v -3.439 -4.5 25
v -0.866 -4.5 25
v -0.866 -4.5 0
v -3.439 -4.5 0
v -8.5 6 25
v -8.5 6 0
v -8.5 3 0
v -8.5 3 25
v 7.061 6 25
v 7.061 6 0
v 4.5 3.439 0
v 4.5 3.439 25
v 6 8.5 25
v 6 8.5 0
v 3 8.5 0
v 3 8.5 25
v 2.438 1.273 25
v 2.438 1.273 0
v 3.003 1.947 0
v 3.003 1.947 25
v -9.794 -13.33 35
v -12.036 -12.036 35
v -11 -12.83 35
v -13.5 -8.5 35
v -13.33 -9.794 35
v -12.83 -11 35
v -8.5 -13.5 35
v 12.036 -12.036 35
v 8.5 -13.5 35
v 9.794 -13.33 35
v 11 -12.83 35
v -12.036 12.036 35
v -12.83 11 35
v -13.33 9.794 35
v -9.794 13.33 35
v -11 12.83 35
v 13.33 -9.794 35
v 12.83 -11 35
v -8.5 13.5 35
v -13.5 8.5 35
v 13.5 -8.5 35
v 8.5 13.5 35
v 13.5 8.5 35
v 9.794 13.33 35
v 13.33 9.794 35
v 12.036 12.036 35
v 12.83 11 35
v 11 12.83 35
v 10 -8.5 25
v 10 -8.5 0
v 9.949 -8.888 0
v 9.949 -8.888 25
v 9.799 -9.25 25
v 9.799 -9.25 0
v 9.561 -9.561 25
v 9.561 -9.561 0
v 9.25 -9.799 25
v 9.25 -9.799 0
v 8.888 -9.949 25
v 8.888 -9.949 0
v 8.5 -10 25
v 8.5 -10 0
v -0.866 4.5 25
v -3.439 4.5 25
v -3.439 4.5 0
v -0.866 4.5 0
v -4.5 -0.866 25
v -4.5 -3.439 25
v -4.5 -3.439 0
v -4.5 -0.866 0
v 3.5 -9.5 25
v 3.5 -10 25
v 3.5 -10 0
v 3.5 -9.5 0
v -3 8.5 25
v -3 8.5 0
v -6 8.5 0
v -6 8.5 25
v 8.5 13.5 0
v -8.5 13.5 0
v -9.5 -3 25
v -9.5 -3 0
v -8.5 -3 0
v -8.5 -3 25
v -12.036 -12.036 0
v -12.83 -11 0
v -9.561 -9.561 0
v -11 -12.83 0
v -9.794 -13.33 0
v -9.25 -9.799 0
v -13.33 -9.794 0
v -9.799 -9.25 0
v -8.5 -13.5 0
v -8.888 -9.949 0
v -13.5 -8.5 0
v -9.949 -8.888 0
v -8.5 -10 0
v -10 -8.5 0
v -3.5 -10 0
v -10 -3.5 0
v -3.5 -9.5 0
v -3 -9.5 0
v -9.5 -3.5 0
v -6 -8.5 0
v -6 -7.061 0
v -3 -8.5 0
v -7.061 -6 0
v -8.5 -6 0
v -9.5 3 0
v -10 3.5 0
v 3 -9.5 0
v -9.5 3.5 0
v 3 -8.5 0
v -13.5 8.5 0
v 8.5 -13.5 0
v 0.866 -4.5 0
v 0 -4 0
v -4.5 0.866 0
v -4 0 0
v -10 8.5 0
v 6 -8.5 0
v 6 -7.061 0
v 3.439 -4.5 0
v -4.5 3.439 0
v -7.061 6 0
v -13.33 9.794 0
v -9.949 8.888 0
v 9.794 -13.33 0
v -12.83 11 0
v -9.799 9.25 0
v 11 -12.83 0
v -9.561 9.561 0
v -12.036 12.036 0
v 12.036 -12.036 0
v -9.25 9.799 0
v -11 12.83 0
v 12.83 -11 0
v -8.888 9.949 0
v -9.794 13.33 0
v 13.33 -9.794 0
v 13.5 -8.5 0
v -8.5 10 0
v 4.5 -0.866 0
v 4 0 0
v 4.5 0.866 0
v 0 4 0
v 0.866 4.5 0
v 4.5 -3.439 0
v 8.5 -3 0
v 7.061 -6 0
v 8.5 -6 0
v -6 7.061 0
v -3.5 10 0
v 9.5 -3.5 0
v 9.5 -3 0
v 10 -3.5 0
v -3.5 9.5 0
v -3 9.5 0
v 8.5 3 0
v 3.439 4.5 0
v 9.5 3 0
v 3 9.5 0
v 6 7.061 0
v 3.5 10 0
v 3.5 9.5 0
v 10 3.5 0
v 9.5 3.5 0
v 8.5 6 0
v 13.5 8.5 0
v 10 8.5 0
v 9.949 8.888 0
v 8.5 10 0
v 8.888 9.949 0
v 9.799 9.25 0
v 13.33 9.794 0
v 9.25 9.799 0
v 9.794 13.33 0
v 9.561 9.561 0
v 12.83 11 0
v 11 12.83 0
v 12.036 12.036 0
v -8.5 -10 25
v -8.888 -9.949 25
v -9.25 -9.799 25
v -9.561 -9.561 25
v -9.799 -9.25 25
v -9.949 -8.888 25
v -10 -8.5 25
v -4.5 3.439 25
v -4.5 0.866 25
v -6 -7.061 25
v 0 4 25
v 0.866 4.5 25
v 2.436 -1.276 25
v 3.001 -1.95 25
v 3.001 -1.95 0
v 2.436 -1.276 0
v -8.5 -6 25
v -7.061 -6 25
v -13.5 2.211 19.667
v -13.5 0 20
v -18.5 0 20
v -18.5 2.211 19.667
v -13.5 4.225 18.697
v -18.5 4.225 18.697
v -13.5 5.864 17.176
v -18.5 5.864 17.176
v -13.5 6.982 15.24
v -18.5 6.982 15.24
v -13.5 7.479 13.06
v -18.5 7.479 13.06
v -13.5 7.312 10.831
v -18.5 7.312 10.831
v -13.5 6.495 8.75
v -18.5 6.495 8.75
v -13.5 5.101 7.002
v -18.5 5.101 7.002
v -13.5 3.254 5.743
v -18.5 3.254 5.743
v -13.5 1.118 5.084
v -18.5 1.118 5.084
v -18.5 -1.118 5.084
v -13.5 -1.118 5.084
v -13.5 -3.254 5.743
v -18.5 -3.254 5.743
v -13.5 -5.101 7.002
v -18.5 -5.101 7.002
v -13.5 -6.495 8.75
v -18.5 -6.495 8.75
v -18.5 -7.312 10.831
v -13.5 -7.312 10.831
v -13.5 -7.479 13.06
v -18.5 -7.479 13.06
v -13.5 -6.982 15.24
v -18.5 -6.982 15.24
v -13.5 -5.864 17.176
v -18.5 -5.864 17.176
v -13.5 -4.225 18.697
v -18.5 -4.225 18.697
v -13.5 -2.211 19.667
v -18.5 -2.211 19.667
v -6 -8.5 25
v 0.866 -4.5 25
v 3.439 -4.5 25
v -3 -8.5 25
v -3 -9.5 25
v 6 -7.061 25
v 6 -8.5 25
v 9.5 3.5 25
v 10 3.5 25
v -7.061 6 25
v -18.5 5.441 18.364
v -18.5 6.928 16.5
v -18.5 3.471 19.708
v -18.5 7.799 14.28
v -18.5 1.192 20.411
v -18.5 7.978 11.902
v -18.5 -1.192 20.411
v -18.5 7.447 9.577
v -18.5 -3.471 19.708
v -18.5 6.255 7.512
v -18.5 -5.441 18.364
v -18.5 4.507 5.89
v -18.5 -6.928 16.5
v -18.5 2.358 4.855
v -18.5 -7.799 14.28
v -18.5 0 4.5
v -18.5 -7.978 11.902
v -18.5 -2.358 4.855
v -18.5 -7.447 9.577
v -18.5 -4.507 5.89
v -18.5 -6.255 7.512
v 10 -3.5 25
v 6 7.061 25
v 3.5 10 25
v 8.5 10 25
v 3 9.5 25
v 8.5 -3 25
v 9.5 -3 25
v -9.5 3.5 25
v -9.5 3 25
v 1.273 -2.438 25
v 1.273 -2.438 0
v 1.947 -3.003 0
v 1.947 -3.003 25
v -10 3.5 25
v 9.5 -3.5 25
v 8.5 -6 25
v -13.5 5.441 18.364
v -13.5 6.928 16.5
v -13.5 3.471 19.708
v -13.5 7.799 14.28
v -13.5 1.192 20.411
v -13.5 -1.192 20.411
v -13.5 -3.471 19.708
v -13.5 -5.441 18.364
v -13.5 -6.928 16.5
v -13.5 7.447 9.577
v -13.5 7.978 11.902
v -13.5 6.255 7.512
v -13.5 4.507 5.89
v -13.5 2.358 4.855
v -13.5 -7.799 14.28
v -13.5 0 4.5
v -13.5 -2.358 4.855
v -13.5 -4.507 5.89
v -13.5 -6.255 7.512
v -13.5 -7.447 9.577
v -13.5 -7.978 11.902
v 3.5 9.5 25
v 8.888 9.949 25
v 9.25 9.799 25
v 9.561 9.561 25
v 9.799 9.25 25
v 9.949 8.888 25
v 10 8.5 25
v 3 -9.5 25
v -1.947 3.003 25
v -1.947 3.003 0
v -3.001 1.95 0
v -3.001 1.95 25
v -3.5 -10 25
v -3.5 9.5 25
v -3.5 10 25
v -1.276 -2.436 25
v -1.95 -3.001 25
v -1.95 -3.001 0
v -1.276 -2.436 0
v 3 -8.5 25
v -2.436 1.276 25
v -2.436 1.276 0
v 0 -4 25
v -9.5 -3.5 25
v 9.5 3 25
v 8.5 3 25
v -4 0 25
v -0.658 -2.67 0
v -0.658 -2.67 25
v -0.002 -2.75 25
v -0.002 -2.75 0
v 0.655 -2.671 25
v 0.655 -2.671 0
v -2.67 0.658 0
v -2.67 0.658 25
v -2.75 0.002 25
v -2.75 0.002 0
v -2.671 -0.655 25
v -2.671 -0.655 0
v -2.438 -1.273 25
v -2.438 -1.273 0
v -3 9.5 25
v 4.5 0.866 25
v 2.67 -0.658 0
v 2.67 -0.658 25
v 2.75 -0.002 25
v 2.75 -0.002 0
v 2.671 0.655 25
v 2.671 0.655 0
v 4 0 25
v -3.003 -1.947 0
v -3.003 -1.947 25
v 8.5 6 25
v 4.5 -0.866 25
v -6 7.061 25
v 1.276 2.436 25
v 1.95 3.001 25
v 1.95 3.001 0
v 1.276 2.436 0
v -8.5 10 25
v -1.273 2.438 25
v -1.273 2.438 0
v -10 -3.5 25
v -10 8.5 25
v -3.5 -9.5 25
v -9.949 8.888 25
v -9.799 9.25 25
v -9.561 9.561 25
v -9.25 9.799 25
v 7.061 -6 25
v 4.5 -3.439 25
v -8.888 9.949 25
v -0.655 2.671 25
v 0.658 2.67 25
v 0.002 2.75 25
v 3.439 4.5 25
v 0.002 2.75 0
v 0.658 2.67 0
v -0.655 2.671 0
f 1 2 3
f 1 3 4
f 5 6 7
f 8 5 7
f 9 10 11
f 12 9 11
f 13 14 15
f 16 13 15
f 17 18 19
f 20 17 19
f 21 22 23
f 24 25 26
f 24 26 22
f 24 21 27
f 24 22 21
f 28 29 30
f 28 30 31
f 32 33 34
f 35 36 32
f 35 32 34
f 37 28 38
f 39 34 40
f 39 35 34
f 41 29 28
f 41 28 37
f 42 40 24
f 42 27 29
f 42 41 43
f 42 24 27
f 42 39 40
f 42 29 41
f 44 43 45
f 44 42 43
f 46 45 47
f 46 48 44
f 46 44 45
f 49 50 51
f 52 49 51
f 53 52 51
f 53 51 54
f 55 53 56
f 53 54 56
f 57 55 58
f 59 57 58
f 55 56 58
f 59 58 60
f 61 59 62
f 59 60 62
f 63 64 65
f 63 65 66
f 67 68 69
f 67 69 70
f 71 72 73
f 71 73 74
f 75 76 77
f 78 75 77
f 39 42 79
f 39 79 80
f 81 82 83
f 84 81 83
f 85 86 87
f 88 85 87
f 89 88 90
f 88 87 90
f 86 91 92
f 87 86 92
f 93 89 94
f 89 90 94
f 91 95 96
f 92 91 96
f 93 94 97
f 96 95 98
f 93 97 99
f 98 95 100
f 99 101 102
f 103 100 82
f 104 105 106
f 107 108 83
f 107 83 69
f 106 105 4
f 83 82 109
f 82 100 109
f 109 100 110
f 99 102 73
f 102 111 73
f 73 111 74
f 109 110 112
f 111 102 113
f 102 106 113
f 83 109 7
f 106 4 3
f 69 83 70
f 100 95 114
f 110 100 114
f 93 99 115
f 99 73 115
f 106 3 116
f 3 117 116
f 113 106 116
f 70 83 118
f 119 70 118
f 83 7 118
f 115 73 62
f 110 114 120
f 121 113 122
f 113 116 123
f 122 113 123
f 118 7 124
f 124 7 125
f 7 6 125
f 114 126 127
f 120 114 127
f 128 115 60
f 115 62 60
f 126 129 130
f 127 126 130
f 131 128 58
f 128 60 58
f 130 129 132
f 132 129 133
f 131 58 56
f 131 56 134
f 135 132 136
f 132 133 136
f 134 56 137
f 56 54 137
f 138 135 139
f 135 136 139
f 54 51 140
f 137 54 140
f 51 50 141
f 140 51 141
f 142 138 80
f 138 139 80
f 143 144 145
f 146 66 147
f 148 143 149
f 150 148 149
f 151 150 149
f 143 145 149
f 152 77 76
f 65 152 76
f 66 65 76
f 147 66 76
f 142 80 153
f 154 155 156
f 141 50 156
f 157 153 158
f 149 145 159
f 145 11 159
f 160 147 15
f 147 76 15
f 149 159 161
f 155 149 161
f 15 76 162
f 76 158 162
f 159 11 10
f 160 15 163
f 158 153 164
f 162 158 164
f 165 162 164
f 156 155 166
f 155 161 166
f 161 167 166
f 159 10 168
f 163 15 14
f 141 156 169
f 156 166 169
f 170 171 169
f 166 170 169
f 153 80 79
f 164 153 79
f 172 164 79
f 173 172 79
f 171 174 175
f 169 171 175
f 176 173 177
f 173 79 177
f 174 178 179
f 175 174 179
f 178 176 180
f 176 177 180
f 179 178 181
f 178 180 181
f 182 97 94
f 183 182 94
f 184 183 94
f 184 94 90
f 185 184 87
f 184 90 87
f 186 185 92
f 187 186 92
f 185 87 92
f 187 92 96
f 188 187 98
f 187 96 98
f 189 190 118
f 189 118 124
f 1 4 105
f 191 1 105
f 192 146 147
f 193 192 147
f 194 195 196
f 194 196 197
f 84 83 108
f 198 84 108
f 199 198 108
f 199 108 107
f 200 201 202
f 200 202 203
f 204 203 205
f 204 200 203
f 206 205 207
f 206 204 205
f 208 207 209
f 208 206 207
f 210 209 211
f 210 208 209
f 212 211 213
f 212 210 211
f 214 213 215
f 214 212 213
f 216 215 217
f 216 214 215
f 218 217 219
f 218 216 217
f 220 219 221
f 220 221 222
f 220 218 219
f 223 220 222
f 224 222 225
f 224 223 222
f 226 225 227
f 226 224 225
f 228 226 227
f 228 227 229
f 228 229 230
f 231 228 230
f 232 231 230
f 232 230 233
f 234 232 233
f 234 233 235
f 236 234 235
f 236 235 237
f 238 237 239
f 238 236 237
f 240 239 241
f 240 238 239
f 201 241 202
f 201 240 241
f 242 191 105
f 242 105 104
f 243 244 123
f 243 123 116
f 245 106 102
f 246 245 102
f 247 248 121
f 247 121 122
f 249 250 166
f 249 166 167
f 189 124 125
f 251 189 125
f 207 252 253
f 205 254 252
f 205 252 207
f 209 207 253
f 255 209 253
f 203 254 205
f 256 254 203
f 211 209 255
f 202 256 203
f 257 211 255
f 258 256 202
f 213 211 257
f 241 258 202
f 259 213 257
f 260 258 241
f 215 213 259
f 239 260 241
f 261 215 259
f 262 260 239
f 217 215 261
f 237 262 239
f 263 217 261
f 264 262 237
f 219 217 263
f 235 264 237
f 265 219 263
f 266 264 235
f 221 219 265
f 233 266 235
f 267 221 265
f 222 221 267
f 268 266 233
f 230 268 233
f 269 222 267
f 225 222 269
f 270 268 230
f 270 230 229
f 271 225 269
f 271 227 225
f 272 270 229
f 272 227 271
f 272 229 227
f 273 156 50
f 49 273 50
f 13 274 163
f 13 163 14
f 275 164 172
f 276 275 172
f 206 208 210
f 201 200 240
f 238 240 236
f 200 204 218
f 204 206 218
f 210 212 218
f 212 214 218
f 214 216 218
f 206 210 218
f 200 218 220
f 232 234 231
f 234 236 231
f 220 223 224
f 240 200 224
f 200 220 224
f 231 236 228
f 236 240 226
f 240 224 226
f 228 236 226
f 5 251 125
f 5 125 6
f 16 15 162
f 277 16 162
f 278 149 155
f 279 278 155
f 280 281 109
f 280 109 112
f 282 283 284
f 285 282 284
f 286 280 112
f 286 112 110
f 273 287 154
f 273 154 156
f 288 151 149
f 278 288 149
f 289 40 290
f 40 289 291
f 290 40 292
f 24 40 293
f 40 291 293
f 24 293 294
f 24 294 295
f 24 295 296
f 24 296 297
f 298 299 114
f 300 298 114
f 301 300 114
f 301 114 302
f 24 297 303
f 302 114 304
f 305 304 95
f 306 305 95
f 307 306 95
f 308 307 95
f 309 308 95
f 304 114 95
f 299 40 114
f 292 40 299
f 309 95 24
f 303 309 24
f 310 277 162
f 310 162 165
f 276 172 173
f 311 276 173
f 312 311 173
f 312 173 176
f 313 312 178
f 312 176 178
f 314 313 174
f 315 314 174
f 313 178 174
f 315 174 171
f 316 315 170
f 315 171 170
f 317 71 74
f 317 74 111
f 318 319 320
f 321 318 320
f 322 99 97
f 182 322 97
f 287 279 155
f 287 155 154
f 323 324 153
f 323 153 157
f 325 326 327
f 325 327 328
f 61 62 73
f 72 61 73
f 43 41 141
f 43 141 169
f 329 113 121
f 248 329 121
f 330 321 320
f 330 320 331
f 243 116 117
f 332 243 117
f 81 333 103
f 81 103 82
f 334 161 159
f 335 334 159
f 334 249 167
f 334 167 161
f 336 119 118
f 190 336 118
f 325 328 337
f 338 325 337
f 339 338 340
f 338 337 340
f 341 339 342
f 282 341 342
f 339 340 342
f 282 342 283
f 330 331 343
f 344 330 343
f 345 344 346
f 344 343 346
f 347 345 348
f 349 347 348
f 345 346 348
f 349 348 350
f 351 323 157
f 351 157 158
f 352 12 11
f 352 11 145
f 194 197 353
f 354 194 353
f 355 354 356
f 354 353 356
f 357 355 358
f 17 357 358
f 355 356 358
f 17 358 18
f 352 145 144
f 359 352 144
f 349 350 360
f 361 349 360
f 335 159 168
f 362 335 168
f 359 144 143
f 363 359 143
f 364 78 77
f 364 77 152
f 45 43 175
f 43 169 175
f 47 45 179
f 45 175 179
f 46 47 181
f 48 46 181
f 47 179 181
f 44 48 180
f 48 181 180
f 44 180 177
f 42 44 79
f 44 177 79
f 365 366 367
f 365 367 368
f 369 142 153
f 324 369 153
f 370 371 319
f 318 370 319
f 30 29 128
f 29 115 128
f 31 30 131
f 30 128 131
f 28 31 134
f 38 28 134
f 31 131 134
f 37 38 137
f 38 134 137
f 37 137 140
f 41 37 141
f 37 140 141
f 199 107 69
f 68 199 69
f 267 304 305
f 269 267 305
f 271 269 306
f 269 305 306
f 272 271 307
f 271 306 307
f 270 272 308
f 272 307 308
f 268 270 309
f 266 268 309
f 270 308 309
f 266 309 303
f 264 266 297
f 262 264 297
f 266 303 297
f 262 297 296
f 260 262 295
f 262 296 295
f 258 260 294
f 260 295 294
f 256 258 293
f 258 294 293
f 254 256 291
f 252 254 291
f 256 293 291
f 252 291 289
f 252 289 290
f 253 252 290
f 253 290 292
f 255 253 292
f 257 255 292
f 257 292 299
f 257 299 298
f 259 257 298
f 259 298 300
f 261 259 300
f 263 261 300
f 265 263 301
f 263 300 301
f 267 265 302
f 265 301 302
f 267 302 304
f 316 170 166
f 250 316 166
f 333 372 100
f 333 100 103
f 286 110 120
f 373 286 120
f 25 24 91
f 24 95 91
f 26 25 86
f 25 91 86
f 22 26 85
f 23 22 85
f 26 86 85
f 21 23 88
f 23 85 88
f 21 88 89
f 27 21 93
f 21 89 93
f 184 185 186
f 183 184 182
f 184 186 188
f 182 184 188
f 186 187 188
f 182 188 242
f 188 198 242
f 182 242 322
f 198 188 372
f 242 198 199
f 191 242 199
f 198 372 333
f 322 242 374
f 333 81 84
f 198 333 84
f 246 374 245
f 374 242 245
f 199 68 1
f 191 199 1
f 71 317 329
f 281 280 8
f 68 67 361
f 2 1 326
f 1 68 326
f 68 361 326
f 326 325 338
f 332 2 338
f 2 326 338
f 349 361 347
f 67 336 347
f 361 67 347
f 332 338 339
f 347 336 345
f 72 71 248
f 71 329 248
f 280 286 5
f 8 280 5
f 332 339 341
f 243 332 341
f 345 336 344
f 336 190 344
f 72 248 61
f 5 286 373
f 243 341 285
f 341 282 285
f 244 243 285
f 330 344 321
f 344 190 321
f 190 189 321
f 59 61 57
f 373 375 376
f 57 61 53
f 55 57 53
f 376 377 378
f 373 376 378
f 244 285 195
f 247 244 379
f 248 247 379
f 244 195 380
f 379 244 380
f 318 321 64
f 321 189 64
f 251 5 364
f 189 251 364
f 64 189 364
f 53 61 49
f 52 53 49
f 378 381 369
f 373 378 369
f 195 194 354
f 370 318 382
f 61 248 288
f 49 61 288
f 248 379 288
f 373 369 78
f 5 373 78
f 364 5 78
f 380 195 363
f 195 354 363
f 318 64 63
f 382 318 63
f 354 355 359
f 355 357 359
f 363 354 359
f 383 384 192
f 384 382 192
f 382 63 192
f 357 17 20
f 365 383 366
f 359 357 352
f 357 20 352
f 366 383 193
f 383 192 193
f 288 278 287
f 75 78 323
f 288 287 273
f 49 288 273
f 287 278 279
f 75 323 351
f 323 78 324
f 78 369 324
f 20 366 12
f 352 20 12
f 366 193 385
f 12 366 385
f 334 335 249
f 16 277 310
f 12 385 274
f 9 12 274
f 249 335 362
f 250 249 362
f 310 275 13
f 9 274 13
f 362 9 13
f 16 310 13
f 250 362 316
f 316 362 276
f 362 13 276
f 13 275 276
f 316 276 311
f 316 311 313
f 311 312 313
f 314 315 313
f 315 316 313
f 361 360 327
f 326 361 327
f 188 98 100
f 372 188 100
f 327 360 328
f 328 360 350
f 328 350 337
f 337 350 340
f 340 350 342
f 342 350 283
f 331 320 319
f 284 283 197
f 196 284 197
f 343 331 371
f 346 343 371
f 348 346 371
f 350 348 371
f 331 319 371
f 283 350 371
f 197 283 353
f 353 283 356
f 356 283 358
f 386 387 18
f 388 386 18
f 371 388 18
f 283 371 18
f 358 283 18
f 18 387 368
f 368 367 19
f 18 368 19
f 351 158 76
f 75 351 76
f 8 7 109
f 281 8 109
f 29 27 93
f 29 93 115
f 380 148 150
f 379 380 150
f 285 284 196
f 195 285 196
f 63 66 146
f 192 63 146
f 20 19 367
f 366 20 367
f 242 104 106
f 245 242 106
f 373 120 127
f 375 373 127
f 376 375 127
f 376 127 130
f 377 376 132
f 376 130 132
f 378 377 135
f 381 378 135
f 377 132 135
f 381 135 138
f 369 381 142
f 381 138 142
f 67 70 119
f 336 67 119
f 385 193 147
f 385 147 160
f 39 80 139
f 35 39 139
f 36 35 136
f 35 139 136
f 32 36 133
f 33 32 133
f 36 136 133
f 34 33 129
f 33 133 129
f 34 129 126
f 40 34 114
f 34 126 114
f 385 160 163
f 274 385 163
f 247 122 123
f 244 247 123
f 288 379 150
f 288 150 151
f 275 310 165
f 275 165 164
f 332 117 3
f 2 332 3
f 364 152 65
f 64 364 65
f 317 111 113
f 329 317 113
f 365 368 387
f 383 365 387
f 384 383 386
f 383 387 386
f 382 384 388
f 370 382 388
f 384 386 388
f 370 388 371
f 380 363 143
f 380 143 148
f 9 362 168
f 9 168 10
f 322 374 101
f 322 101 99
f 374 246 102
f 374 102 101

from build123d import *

# Parameters (mm, degrees)
BOSS_EXTRU_5_DEPTH = 25
ESQUISSE7_R        = 8
ESQUISSE7_R_2      = 7.5
BOSS_EXTRU_7_DEPTH = 5
BOSS_EXTRU_6_DEPTH = 10


# Read off the part's stored shape, not the designer's step: Boss.-Extru.5
with BuildPart() as part:
    # Boss.-Extru.5 outline → Boss.-Extru.5 (new body)
    # profile 1 of 2: a face of its own
    with BuildSketch(Plane.XY):
        with BuildLine():
            Line((-8.5, -13.5), (8.5, -13.5))
            ThreePointArc((8.5, -13.5), (12.035533906, -12.035533906), (13.5, -8.5))
            Line((13.5, -8.5), (13.5, 8.5))
            ThreePointArc((13.5, 8.5), (12.035533906, 12.035533906), (8.5, 13.5))
            Line((8.5, 13.5), (-8.5, 13.5))
            ThreePointArc((-8.5, 13.5), (-12.035533906, 12.035533906), (-13.5, 8.5))
            Line((-13.5, 8.5), (-13.5, -8.5))
            ThreePointArc((-13.5, -8.5), (-12.035533906, -12.035533906), (-8.5, -13.5))
        make_face()
        with BuildLine():
            Line((-10, 3.5), (-10, 8.5))
            ThreePointArc((-10, 8.5), (-9.560660172, 9.560660172), (-8.5, 10))
            Line((-8.5, 10), (-3.5, 10))
            Line((-3.5, 10), (-3.5, 9.5))
            Line((-3.5, 9.5), (-3, 9.5))
            Line((-3, 9.5), (-3, 8.5))
            Line((-3, 8.5), (-6, 8.5))
            Line((-6, 8.5), (-6, 7.060660172))
            Line((-6, 7.060660172), (-3.439339828, 4.5))
            Line((-3.439339828, 4.5), (-0.866025404, 4.5))
            Line((-0.866025404, 4.5), (0, 4))
            Line((0, 4), (0.866025404, 4.5))
            Line((0.866025404, 4.5), (3.439339828, 4.5))
            Line((3.439339828, 4.5), (6, 7.060660172))
            Line((6, 7.060660172), (6, 8.5))
            Line((6, 8.5), (3, 8.5))
            Line((3, 8.5), (3, 9.5))
            Line((3, 9.5), (3.5, 9.5))
            Line((3.5, 9.5), (3.5, 10))
            Line((3.5, 10), (8.5, 10))
            ThreePointArc((8.5, 10), (9.560660172, 9.560660172), (10, 8.5))
            Line((10, 8.5), (10, 3.5))
            Line((10, 3.5), (9.5, 3.5))
            Line((9.5, 3.5), (9.5, 3))
            Line((9.5, 3), (8.5, 3))
            Line((8.5, 3), (8.5, 6))
            Line((8.5, 6), (7.060660172, 6))
            Line((7.060660172, 6), (4.5, 3.439339828))
            Line((4.5, 3.439339828), (4.5, 0.866025404))
            Line((4.5, 0.866025404), (4, 0))
            Line((4, 0), (4.5, -0.866025404))
            Line((4.5, -0.866025404), (4.5, -3.439339828))
            Line((4.5, -3.439339828), (7.060660172, -6))
            Line((7.060660172, -6), (8.5, -6))
            Line((8.5, -6), (8.5, -3))
            Line((8.5, -3), (9.5, -3))
            Line((9.5, -3), (9.5, -3.5))
            Line((9.5, -3.5), (10, -3.5))
            Line((10, -3.5), (10, -8.5))
            ThreePointArc((10, -8.5), (9.560660172, -9.560660172), (8.5, -10))
            Line((8.5, -10), (3.5, -10))
            Line((3.5, -10), (3.5, -9.5))
            Line((3.5, -9.5), (3, -9.5))
            Line((3, -9.5), (3, -8.5))
            Line((3, -8.5), (6, -8.5))
            Line((6, -8.5), (6, -7.060660172))
            Line((6, -7.060660172), (3.439339828, -4.5))
            Line((3.439339828, -4.5), (0.866025404, -4.5))
            Line((0.866025404, -4.5), (0, -4))
            Line((0, -4), (-0.866025404, -4.5))
            Line((-0.866025404, -4.5), (-3.439339828, -4.5))
            Line((-3.439339828, -4.5), (-6, -7.060660172))
            Line((-6, -7.060660172), (-6, -8.5))
            Line((-6, -8.5), (-3, -8.5))
            Line((-3, -8.5), (-3, -9.5))
            Line((-3, -9.5), (-3.5, -9.5))
            Line((-3.5, -9.5), (-3.5, -10))
            Line((-3.5, -10), (-8.5, -10))
            ThreePointArc((-8.5, -10), (-9.560660172, -9.560660172), (-10, -8.5))
            Line((-10, -8.5), (-10, -3.5))
            Line((-10, -3.5), (-9.5, -3.5))
            Line((-9.5, -3.5), (-9.5, -3))
            Line((-9.5, -3), (-8.5, -3))
            Line((-8.5, -3), (-8.5, -6))
            Line((-8.5, -6), (-7.060660172, -6))
            Line((-7.060660172, -6), (-4.5, -3.439339828))
            Line((-4.5, -3.439339828), (-4.5, -0.866025404))
            Line((-4.5, -0.866025404), (-4, 0))
            Line((-4, 0), (-4.5, 0.866025404))
            Line((-4.5, 0.866025404), (-4.5, 3.439339828))
            Line((-4.5, 3.439339828), (-7.060660172, 6))
            Line((-7.060660172, 6), (-8.5, 6))
            Line((-8.5, 6), (-8.5, 3))
            Line((-8.5, 3), (-9.5, 3))
            Line((-9.5, 3), (-9.5, 3.5))
            Line((-9.5, 3.5), (-10, 3.5))
        make_face(mode=Mode.SUBTRACT)
    # profile 2 of 2: a face of its own
    with BuildSketch(Plane.XY):
        with BuildLine():
            Line((1.949592103, 3.000876196), (1.276279893, 2.435900169))
            ThreePointArc((1.276279893, 2.435900169), (0.001756003, 2.749999439), (-1.273167982, 2.43752811))
            Line((-1.273167982, 2.43752811), (-1.947287092, 3.003181207))
            Line((-1.947287092, 3.003181207), (-3.000876196, 1.949592103))
            Line((-3.000876196, 1.949592103), (-2.435900169, 1.276279893))
            ThreePointArc((-2.435900169, 1.276279893), (-2.749999439, 0.001756003), (-2.43752811, -1.273167982))
            Line((-2.43752811, -1.273167982), (-3.003181207, -1.947287092))
            Line((-3.003181207, -1.947287092), (-1.949592103, -3.000876196))
            Line((-1.949592103, -3.000876196), (-1.276279893, -2.435900169))
            ThreePointArc((-1.276279893, -2.435900169), (-0.001756003, -2.749999439), (1.273167982, -2.43752811))
            Line((1.273167982, -2.43752811), (1.947287092, -3.003181207))
            Line((1.947287092, -3.003181207), (3.000876196, -1.949592103))
            Line((3.000876196, -1.949592103), (2.435900169, -1.276279893))
            ThreePointArc((2.435900169, -1.276279893), (2.749999439, -0.001756003), (2.43752811, 1.273167982))
            Line((2.43752811, 1.273167982), (3.003181207, 1.947287092))
            Line((3.003181207, 1.947287092), (1.949592103, 3.000876196))
        make_face()
    extrude(amount=BOSS_EXTRU_5_DEPTH)

    # Esquisse7 → Boss.-Extru.7 (add)
    with BuildSketch(Plane.ZY.offset(13.5)):
        with Locations(Location((12.5, 0, 0), (0, 0, 180))):
            Circle(ESQUISSE7_R)
        with Locations((12.5, 0)):
            Circle(ESQUISSE7_R_2, mode=Mode.SUBTRACT)
    extrude(amount=BOSS_EXTRU_7_DEPTH)

    # Esquisse6 → Boss.-Extru.6 (add)
    with BuildSketch(Plane.XY.offset(25)):
        with BuildLine():
            Line((-13.5, 8.5), (-13.5, -8.5))
            ThreePointArc((-13.5, -8.5), (-12.035533906, -12.035533906), (-8.5, -13.5))
            Line((-8.5, -13.5), (8.5, -13.5))
            ThreePointArc((8.5, -13.5), (12.035533906, -12.035533906), (13.5, -8.5))
            Line((13.5, -8.5), (13.5, 8.5))
            ThreePointArc((13.5, 8.5), (12.035533906, 12.035533906), (8.5, 13.5))
            Line((8.5, 13.5), (-8.5, 13.5))
            ThreePointArc((-8.5, 13.5), (-12.035533906, 12.035533906), (-13.5, 8.5))
        make_face()
    extrude(amount=BOSS_EXTRU_6_DEPTH)


solid = part.part
